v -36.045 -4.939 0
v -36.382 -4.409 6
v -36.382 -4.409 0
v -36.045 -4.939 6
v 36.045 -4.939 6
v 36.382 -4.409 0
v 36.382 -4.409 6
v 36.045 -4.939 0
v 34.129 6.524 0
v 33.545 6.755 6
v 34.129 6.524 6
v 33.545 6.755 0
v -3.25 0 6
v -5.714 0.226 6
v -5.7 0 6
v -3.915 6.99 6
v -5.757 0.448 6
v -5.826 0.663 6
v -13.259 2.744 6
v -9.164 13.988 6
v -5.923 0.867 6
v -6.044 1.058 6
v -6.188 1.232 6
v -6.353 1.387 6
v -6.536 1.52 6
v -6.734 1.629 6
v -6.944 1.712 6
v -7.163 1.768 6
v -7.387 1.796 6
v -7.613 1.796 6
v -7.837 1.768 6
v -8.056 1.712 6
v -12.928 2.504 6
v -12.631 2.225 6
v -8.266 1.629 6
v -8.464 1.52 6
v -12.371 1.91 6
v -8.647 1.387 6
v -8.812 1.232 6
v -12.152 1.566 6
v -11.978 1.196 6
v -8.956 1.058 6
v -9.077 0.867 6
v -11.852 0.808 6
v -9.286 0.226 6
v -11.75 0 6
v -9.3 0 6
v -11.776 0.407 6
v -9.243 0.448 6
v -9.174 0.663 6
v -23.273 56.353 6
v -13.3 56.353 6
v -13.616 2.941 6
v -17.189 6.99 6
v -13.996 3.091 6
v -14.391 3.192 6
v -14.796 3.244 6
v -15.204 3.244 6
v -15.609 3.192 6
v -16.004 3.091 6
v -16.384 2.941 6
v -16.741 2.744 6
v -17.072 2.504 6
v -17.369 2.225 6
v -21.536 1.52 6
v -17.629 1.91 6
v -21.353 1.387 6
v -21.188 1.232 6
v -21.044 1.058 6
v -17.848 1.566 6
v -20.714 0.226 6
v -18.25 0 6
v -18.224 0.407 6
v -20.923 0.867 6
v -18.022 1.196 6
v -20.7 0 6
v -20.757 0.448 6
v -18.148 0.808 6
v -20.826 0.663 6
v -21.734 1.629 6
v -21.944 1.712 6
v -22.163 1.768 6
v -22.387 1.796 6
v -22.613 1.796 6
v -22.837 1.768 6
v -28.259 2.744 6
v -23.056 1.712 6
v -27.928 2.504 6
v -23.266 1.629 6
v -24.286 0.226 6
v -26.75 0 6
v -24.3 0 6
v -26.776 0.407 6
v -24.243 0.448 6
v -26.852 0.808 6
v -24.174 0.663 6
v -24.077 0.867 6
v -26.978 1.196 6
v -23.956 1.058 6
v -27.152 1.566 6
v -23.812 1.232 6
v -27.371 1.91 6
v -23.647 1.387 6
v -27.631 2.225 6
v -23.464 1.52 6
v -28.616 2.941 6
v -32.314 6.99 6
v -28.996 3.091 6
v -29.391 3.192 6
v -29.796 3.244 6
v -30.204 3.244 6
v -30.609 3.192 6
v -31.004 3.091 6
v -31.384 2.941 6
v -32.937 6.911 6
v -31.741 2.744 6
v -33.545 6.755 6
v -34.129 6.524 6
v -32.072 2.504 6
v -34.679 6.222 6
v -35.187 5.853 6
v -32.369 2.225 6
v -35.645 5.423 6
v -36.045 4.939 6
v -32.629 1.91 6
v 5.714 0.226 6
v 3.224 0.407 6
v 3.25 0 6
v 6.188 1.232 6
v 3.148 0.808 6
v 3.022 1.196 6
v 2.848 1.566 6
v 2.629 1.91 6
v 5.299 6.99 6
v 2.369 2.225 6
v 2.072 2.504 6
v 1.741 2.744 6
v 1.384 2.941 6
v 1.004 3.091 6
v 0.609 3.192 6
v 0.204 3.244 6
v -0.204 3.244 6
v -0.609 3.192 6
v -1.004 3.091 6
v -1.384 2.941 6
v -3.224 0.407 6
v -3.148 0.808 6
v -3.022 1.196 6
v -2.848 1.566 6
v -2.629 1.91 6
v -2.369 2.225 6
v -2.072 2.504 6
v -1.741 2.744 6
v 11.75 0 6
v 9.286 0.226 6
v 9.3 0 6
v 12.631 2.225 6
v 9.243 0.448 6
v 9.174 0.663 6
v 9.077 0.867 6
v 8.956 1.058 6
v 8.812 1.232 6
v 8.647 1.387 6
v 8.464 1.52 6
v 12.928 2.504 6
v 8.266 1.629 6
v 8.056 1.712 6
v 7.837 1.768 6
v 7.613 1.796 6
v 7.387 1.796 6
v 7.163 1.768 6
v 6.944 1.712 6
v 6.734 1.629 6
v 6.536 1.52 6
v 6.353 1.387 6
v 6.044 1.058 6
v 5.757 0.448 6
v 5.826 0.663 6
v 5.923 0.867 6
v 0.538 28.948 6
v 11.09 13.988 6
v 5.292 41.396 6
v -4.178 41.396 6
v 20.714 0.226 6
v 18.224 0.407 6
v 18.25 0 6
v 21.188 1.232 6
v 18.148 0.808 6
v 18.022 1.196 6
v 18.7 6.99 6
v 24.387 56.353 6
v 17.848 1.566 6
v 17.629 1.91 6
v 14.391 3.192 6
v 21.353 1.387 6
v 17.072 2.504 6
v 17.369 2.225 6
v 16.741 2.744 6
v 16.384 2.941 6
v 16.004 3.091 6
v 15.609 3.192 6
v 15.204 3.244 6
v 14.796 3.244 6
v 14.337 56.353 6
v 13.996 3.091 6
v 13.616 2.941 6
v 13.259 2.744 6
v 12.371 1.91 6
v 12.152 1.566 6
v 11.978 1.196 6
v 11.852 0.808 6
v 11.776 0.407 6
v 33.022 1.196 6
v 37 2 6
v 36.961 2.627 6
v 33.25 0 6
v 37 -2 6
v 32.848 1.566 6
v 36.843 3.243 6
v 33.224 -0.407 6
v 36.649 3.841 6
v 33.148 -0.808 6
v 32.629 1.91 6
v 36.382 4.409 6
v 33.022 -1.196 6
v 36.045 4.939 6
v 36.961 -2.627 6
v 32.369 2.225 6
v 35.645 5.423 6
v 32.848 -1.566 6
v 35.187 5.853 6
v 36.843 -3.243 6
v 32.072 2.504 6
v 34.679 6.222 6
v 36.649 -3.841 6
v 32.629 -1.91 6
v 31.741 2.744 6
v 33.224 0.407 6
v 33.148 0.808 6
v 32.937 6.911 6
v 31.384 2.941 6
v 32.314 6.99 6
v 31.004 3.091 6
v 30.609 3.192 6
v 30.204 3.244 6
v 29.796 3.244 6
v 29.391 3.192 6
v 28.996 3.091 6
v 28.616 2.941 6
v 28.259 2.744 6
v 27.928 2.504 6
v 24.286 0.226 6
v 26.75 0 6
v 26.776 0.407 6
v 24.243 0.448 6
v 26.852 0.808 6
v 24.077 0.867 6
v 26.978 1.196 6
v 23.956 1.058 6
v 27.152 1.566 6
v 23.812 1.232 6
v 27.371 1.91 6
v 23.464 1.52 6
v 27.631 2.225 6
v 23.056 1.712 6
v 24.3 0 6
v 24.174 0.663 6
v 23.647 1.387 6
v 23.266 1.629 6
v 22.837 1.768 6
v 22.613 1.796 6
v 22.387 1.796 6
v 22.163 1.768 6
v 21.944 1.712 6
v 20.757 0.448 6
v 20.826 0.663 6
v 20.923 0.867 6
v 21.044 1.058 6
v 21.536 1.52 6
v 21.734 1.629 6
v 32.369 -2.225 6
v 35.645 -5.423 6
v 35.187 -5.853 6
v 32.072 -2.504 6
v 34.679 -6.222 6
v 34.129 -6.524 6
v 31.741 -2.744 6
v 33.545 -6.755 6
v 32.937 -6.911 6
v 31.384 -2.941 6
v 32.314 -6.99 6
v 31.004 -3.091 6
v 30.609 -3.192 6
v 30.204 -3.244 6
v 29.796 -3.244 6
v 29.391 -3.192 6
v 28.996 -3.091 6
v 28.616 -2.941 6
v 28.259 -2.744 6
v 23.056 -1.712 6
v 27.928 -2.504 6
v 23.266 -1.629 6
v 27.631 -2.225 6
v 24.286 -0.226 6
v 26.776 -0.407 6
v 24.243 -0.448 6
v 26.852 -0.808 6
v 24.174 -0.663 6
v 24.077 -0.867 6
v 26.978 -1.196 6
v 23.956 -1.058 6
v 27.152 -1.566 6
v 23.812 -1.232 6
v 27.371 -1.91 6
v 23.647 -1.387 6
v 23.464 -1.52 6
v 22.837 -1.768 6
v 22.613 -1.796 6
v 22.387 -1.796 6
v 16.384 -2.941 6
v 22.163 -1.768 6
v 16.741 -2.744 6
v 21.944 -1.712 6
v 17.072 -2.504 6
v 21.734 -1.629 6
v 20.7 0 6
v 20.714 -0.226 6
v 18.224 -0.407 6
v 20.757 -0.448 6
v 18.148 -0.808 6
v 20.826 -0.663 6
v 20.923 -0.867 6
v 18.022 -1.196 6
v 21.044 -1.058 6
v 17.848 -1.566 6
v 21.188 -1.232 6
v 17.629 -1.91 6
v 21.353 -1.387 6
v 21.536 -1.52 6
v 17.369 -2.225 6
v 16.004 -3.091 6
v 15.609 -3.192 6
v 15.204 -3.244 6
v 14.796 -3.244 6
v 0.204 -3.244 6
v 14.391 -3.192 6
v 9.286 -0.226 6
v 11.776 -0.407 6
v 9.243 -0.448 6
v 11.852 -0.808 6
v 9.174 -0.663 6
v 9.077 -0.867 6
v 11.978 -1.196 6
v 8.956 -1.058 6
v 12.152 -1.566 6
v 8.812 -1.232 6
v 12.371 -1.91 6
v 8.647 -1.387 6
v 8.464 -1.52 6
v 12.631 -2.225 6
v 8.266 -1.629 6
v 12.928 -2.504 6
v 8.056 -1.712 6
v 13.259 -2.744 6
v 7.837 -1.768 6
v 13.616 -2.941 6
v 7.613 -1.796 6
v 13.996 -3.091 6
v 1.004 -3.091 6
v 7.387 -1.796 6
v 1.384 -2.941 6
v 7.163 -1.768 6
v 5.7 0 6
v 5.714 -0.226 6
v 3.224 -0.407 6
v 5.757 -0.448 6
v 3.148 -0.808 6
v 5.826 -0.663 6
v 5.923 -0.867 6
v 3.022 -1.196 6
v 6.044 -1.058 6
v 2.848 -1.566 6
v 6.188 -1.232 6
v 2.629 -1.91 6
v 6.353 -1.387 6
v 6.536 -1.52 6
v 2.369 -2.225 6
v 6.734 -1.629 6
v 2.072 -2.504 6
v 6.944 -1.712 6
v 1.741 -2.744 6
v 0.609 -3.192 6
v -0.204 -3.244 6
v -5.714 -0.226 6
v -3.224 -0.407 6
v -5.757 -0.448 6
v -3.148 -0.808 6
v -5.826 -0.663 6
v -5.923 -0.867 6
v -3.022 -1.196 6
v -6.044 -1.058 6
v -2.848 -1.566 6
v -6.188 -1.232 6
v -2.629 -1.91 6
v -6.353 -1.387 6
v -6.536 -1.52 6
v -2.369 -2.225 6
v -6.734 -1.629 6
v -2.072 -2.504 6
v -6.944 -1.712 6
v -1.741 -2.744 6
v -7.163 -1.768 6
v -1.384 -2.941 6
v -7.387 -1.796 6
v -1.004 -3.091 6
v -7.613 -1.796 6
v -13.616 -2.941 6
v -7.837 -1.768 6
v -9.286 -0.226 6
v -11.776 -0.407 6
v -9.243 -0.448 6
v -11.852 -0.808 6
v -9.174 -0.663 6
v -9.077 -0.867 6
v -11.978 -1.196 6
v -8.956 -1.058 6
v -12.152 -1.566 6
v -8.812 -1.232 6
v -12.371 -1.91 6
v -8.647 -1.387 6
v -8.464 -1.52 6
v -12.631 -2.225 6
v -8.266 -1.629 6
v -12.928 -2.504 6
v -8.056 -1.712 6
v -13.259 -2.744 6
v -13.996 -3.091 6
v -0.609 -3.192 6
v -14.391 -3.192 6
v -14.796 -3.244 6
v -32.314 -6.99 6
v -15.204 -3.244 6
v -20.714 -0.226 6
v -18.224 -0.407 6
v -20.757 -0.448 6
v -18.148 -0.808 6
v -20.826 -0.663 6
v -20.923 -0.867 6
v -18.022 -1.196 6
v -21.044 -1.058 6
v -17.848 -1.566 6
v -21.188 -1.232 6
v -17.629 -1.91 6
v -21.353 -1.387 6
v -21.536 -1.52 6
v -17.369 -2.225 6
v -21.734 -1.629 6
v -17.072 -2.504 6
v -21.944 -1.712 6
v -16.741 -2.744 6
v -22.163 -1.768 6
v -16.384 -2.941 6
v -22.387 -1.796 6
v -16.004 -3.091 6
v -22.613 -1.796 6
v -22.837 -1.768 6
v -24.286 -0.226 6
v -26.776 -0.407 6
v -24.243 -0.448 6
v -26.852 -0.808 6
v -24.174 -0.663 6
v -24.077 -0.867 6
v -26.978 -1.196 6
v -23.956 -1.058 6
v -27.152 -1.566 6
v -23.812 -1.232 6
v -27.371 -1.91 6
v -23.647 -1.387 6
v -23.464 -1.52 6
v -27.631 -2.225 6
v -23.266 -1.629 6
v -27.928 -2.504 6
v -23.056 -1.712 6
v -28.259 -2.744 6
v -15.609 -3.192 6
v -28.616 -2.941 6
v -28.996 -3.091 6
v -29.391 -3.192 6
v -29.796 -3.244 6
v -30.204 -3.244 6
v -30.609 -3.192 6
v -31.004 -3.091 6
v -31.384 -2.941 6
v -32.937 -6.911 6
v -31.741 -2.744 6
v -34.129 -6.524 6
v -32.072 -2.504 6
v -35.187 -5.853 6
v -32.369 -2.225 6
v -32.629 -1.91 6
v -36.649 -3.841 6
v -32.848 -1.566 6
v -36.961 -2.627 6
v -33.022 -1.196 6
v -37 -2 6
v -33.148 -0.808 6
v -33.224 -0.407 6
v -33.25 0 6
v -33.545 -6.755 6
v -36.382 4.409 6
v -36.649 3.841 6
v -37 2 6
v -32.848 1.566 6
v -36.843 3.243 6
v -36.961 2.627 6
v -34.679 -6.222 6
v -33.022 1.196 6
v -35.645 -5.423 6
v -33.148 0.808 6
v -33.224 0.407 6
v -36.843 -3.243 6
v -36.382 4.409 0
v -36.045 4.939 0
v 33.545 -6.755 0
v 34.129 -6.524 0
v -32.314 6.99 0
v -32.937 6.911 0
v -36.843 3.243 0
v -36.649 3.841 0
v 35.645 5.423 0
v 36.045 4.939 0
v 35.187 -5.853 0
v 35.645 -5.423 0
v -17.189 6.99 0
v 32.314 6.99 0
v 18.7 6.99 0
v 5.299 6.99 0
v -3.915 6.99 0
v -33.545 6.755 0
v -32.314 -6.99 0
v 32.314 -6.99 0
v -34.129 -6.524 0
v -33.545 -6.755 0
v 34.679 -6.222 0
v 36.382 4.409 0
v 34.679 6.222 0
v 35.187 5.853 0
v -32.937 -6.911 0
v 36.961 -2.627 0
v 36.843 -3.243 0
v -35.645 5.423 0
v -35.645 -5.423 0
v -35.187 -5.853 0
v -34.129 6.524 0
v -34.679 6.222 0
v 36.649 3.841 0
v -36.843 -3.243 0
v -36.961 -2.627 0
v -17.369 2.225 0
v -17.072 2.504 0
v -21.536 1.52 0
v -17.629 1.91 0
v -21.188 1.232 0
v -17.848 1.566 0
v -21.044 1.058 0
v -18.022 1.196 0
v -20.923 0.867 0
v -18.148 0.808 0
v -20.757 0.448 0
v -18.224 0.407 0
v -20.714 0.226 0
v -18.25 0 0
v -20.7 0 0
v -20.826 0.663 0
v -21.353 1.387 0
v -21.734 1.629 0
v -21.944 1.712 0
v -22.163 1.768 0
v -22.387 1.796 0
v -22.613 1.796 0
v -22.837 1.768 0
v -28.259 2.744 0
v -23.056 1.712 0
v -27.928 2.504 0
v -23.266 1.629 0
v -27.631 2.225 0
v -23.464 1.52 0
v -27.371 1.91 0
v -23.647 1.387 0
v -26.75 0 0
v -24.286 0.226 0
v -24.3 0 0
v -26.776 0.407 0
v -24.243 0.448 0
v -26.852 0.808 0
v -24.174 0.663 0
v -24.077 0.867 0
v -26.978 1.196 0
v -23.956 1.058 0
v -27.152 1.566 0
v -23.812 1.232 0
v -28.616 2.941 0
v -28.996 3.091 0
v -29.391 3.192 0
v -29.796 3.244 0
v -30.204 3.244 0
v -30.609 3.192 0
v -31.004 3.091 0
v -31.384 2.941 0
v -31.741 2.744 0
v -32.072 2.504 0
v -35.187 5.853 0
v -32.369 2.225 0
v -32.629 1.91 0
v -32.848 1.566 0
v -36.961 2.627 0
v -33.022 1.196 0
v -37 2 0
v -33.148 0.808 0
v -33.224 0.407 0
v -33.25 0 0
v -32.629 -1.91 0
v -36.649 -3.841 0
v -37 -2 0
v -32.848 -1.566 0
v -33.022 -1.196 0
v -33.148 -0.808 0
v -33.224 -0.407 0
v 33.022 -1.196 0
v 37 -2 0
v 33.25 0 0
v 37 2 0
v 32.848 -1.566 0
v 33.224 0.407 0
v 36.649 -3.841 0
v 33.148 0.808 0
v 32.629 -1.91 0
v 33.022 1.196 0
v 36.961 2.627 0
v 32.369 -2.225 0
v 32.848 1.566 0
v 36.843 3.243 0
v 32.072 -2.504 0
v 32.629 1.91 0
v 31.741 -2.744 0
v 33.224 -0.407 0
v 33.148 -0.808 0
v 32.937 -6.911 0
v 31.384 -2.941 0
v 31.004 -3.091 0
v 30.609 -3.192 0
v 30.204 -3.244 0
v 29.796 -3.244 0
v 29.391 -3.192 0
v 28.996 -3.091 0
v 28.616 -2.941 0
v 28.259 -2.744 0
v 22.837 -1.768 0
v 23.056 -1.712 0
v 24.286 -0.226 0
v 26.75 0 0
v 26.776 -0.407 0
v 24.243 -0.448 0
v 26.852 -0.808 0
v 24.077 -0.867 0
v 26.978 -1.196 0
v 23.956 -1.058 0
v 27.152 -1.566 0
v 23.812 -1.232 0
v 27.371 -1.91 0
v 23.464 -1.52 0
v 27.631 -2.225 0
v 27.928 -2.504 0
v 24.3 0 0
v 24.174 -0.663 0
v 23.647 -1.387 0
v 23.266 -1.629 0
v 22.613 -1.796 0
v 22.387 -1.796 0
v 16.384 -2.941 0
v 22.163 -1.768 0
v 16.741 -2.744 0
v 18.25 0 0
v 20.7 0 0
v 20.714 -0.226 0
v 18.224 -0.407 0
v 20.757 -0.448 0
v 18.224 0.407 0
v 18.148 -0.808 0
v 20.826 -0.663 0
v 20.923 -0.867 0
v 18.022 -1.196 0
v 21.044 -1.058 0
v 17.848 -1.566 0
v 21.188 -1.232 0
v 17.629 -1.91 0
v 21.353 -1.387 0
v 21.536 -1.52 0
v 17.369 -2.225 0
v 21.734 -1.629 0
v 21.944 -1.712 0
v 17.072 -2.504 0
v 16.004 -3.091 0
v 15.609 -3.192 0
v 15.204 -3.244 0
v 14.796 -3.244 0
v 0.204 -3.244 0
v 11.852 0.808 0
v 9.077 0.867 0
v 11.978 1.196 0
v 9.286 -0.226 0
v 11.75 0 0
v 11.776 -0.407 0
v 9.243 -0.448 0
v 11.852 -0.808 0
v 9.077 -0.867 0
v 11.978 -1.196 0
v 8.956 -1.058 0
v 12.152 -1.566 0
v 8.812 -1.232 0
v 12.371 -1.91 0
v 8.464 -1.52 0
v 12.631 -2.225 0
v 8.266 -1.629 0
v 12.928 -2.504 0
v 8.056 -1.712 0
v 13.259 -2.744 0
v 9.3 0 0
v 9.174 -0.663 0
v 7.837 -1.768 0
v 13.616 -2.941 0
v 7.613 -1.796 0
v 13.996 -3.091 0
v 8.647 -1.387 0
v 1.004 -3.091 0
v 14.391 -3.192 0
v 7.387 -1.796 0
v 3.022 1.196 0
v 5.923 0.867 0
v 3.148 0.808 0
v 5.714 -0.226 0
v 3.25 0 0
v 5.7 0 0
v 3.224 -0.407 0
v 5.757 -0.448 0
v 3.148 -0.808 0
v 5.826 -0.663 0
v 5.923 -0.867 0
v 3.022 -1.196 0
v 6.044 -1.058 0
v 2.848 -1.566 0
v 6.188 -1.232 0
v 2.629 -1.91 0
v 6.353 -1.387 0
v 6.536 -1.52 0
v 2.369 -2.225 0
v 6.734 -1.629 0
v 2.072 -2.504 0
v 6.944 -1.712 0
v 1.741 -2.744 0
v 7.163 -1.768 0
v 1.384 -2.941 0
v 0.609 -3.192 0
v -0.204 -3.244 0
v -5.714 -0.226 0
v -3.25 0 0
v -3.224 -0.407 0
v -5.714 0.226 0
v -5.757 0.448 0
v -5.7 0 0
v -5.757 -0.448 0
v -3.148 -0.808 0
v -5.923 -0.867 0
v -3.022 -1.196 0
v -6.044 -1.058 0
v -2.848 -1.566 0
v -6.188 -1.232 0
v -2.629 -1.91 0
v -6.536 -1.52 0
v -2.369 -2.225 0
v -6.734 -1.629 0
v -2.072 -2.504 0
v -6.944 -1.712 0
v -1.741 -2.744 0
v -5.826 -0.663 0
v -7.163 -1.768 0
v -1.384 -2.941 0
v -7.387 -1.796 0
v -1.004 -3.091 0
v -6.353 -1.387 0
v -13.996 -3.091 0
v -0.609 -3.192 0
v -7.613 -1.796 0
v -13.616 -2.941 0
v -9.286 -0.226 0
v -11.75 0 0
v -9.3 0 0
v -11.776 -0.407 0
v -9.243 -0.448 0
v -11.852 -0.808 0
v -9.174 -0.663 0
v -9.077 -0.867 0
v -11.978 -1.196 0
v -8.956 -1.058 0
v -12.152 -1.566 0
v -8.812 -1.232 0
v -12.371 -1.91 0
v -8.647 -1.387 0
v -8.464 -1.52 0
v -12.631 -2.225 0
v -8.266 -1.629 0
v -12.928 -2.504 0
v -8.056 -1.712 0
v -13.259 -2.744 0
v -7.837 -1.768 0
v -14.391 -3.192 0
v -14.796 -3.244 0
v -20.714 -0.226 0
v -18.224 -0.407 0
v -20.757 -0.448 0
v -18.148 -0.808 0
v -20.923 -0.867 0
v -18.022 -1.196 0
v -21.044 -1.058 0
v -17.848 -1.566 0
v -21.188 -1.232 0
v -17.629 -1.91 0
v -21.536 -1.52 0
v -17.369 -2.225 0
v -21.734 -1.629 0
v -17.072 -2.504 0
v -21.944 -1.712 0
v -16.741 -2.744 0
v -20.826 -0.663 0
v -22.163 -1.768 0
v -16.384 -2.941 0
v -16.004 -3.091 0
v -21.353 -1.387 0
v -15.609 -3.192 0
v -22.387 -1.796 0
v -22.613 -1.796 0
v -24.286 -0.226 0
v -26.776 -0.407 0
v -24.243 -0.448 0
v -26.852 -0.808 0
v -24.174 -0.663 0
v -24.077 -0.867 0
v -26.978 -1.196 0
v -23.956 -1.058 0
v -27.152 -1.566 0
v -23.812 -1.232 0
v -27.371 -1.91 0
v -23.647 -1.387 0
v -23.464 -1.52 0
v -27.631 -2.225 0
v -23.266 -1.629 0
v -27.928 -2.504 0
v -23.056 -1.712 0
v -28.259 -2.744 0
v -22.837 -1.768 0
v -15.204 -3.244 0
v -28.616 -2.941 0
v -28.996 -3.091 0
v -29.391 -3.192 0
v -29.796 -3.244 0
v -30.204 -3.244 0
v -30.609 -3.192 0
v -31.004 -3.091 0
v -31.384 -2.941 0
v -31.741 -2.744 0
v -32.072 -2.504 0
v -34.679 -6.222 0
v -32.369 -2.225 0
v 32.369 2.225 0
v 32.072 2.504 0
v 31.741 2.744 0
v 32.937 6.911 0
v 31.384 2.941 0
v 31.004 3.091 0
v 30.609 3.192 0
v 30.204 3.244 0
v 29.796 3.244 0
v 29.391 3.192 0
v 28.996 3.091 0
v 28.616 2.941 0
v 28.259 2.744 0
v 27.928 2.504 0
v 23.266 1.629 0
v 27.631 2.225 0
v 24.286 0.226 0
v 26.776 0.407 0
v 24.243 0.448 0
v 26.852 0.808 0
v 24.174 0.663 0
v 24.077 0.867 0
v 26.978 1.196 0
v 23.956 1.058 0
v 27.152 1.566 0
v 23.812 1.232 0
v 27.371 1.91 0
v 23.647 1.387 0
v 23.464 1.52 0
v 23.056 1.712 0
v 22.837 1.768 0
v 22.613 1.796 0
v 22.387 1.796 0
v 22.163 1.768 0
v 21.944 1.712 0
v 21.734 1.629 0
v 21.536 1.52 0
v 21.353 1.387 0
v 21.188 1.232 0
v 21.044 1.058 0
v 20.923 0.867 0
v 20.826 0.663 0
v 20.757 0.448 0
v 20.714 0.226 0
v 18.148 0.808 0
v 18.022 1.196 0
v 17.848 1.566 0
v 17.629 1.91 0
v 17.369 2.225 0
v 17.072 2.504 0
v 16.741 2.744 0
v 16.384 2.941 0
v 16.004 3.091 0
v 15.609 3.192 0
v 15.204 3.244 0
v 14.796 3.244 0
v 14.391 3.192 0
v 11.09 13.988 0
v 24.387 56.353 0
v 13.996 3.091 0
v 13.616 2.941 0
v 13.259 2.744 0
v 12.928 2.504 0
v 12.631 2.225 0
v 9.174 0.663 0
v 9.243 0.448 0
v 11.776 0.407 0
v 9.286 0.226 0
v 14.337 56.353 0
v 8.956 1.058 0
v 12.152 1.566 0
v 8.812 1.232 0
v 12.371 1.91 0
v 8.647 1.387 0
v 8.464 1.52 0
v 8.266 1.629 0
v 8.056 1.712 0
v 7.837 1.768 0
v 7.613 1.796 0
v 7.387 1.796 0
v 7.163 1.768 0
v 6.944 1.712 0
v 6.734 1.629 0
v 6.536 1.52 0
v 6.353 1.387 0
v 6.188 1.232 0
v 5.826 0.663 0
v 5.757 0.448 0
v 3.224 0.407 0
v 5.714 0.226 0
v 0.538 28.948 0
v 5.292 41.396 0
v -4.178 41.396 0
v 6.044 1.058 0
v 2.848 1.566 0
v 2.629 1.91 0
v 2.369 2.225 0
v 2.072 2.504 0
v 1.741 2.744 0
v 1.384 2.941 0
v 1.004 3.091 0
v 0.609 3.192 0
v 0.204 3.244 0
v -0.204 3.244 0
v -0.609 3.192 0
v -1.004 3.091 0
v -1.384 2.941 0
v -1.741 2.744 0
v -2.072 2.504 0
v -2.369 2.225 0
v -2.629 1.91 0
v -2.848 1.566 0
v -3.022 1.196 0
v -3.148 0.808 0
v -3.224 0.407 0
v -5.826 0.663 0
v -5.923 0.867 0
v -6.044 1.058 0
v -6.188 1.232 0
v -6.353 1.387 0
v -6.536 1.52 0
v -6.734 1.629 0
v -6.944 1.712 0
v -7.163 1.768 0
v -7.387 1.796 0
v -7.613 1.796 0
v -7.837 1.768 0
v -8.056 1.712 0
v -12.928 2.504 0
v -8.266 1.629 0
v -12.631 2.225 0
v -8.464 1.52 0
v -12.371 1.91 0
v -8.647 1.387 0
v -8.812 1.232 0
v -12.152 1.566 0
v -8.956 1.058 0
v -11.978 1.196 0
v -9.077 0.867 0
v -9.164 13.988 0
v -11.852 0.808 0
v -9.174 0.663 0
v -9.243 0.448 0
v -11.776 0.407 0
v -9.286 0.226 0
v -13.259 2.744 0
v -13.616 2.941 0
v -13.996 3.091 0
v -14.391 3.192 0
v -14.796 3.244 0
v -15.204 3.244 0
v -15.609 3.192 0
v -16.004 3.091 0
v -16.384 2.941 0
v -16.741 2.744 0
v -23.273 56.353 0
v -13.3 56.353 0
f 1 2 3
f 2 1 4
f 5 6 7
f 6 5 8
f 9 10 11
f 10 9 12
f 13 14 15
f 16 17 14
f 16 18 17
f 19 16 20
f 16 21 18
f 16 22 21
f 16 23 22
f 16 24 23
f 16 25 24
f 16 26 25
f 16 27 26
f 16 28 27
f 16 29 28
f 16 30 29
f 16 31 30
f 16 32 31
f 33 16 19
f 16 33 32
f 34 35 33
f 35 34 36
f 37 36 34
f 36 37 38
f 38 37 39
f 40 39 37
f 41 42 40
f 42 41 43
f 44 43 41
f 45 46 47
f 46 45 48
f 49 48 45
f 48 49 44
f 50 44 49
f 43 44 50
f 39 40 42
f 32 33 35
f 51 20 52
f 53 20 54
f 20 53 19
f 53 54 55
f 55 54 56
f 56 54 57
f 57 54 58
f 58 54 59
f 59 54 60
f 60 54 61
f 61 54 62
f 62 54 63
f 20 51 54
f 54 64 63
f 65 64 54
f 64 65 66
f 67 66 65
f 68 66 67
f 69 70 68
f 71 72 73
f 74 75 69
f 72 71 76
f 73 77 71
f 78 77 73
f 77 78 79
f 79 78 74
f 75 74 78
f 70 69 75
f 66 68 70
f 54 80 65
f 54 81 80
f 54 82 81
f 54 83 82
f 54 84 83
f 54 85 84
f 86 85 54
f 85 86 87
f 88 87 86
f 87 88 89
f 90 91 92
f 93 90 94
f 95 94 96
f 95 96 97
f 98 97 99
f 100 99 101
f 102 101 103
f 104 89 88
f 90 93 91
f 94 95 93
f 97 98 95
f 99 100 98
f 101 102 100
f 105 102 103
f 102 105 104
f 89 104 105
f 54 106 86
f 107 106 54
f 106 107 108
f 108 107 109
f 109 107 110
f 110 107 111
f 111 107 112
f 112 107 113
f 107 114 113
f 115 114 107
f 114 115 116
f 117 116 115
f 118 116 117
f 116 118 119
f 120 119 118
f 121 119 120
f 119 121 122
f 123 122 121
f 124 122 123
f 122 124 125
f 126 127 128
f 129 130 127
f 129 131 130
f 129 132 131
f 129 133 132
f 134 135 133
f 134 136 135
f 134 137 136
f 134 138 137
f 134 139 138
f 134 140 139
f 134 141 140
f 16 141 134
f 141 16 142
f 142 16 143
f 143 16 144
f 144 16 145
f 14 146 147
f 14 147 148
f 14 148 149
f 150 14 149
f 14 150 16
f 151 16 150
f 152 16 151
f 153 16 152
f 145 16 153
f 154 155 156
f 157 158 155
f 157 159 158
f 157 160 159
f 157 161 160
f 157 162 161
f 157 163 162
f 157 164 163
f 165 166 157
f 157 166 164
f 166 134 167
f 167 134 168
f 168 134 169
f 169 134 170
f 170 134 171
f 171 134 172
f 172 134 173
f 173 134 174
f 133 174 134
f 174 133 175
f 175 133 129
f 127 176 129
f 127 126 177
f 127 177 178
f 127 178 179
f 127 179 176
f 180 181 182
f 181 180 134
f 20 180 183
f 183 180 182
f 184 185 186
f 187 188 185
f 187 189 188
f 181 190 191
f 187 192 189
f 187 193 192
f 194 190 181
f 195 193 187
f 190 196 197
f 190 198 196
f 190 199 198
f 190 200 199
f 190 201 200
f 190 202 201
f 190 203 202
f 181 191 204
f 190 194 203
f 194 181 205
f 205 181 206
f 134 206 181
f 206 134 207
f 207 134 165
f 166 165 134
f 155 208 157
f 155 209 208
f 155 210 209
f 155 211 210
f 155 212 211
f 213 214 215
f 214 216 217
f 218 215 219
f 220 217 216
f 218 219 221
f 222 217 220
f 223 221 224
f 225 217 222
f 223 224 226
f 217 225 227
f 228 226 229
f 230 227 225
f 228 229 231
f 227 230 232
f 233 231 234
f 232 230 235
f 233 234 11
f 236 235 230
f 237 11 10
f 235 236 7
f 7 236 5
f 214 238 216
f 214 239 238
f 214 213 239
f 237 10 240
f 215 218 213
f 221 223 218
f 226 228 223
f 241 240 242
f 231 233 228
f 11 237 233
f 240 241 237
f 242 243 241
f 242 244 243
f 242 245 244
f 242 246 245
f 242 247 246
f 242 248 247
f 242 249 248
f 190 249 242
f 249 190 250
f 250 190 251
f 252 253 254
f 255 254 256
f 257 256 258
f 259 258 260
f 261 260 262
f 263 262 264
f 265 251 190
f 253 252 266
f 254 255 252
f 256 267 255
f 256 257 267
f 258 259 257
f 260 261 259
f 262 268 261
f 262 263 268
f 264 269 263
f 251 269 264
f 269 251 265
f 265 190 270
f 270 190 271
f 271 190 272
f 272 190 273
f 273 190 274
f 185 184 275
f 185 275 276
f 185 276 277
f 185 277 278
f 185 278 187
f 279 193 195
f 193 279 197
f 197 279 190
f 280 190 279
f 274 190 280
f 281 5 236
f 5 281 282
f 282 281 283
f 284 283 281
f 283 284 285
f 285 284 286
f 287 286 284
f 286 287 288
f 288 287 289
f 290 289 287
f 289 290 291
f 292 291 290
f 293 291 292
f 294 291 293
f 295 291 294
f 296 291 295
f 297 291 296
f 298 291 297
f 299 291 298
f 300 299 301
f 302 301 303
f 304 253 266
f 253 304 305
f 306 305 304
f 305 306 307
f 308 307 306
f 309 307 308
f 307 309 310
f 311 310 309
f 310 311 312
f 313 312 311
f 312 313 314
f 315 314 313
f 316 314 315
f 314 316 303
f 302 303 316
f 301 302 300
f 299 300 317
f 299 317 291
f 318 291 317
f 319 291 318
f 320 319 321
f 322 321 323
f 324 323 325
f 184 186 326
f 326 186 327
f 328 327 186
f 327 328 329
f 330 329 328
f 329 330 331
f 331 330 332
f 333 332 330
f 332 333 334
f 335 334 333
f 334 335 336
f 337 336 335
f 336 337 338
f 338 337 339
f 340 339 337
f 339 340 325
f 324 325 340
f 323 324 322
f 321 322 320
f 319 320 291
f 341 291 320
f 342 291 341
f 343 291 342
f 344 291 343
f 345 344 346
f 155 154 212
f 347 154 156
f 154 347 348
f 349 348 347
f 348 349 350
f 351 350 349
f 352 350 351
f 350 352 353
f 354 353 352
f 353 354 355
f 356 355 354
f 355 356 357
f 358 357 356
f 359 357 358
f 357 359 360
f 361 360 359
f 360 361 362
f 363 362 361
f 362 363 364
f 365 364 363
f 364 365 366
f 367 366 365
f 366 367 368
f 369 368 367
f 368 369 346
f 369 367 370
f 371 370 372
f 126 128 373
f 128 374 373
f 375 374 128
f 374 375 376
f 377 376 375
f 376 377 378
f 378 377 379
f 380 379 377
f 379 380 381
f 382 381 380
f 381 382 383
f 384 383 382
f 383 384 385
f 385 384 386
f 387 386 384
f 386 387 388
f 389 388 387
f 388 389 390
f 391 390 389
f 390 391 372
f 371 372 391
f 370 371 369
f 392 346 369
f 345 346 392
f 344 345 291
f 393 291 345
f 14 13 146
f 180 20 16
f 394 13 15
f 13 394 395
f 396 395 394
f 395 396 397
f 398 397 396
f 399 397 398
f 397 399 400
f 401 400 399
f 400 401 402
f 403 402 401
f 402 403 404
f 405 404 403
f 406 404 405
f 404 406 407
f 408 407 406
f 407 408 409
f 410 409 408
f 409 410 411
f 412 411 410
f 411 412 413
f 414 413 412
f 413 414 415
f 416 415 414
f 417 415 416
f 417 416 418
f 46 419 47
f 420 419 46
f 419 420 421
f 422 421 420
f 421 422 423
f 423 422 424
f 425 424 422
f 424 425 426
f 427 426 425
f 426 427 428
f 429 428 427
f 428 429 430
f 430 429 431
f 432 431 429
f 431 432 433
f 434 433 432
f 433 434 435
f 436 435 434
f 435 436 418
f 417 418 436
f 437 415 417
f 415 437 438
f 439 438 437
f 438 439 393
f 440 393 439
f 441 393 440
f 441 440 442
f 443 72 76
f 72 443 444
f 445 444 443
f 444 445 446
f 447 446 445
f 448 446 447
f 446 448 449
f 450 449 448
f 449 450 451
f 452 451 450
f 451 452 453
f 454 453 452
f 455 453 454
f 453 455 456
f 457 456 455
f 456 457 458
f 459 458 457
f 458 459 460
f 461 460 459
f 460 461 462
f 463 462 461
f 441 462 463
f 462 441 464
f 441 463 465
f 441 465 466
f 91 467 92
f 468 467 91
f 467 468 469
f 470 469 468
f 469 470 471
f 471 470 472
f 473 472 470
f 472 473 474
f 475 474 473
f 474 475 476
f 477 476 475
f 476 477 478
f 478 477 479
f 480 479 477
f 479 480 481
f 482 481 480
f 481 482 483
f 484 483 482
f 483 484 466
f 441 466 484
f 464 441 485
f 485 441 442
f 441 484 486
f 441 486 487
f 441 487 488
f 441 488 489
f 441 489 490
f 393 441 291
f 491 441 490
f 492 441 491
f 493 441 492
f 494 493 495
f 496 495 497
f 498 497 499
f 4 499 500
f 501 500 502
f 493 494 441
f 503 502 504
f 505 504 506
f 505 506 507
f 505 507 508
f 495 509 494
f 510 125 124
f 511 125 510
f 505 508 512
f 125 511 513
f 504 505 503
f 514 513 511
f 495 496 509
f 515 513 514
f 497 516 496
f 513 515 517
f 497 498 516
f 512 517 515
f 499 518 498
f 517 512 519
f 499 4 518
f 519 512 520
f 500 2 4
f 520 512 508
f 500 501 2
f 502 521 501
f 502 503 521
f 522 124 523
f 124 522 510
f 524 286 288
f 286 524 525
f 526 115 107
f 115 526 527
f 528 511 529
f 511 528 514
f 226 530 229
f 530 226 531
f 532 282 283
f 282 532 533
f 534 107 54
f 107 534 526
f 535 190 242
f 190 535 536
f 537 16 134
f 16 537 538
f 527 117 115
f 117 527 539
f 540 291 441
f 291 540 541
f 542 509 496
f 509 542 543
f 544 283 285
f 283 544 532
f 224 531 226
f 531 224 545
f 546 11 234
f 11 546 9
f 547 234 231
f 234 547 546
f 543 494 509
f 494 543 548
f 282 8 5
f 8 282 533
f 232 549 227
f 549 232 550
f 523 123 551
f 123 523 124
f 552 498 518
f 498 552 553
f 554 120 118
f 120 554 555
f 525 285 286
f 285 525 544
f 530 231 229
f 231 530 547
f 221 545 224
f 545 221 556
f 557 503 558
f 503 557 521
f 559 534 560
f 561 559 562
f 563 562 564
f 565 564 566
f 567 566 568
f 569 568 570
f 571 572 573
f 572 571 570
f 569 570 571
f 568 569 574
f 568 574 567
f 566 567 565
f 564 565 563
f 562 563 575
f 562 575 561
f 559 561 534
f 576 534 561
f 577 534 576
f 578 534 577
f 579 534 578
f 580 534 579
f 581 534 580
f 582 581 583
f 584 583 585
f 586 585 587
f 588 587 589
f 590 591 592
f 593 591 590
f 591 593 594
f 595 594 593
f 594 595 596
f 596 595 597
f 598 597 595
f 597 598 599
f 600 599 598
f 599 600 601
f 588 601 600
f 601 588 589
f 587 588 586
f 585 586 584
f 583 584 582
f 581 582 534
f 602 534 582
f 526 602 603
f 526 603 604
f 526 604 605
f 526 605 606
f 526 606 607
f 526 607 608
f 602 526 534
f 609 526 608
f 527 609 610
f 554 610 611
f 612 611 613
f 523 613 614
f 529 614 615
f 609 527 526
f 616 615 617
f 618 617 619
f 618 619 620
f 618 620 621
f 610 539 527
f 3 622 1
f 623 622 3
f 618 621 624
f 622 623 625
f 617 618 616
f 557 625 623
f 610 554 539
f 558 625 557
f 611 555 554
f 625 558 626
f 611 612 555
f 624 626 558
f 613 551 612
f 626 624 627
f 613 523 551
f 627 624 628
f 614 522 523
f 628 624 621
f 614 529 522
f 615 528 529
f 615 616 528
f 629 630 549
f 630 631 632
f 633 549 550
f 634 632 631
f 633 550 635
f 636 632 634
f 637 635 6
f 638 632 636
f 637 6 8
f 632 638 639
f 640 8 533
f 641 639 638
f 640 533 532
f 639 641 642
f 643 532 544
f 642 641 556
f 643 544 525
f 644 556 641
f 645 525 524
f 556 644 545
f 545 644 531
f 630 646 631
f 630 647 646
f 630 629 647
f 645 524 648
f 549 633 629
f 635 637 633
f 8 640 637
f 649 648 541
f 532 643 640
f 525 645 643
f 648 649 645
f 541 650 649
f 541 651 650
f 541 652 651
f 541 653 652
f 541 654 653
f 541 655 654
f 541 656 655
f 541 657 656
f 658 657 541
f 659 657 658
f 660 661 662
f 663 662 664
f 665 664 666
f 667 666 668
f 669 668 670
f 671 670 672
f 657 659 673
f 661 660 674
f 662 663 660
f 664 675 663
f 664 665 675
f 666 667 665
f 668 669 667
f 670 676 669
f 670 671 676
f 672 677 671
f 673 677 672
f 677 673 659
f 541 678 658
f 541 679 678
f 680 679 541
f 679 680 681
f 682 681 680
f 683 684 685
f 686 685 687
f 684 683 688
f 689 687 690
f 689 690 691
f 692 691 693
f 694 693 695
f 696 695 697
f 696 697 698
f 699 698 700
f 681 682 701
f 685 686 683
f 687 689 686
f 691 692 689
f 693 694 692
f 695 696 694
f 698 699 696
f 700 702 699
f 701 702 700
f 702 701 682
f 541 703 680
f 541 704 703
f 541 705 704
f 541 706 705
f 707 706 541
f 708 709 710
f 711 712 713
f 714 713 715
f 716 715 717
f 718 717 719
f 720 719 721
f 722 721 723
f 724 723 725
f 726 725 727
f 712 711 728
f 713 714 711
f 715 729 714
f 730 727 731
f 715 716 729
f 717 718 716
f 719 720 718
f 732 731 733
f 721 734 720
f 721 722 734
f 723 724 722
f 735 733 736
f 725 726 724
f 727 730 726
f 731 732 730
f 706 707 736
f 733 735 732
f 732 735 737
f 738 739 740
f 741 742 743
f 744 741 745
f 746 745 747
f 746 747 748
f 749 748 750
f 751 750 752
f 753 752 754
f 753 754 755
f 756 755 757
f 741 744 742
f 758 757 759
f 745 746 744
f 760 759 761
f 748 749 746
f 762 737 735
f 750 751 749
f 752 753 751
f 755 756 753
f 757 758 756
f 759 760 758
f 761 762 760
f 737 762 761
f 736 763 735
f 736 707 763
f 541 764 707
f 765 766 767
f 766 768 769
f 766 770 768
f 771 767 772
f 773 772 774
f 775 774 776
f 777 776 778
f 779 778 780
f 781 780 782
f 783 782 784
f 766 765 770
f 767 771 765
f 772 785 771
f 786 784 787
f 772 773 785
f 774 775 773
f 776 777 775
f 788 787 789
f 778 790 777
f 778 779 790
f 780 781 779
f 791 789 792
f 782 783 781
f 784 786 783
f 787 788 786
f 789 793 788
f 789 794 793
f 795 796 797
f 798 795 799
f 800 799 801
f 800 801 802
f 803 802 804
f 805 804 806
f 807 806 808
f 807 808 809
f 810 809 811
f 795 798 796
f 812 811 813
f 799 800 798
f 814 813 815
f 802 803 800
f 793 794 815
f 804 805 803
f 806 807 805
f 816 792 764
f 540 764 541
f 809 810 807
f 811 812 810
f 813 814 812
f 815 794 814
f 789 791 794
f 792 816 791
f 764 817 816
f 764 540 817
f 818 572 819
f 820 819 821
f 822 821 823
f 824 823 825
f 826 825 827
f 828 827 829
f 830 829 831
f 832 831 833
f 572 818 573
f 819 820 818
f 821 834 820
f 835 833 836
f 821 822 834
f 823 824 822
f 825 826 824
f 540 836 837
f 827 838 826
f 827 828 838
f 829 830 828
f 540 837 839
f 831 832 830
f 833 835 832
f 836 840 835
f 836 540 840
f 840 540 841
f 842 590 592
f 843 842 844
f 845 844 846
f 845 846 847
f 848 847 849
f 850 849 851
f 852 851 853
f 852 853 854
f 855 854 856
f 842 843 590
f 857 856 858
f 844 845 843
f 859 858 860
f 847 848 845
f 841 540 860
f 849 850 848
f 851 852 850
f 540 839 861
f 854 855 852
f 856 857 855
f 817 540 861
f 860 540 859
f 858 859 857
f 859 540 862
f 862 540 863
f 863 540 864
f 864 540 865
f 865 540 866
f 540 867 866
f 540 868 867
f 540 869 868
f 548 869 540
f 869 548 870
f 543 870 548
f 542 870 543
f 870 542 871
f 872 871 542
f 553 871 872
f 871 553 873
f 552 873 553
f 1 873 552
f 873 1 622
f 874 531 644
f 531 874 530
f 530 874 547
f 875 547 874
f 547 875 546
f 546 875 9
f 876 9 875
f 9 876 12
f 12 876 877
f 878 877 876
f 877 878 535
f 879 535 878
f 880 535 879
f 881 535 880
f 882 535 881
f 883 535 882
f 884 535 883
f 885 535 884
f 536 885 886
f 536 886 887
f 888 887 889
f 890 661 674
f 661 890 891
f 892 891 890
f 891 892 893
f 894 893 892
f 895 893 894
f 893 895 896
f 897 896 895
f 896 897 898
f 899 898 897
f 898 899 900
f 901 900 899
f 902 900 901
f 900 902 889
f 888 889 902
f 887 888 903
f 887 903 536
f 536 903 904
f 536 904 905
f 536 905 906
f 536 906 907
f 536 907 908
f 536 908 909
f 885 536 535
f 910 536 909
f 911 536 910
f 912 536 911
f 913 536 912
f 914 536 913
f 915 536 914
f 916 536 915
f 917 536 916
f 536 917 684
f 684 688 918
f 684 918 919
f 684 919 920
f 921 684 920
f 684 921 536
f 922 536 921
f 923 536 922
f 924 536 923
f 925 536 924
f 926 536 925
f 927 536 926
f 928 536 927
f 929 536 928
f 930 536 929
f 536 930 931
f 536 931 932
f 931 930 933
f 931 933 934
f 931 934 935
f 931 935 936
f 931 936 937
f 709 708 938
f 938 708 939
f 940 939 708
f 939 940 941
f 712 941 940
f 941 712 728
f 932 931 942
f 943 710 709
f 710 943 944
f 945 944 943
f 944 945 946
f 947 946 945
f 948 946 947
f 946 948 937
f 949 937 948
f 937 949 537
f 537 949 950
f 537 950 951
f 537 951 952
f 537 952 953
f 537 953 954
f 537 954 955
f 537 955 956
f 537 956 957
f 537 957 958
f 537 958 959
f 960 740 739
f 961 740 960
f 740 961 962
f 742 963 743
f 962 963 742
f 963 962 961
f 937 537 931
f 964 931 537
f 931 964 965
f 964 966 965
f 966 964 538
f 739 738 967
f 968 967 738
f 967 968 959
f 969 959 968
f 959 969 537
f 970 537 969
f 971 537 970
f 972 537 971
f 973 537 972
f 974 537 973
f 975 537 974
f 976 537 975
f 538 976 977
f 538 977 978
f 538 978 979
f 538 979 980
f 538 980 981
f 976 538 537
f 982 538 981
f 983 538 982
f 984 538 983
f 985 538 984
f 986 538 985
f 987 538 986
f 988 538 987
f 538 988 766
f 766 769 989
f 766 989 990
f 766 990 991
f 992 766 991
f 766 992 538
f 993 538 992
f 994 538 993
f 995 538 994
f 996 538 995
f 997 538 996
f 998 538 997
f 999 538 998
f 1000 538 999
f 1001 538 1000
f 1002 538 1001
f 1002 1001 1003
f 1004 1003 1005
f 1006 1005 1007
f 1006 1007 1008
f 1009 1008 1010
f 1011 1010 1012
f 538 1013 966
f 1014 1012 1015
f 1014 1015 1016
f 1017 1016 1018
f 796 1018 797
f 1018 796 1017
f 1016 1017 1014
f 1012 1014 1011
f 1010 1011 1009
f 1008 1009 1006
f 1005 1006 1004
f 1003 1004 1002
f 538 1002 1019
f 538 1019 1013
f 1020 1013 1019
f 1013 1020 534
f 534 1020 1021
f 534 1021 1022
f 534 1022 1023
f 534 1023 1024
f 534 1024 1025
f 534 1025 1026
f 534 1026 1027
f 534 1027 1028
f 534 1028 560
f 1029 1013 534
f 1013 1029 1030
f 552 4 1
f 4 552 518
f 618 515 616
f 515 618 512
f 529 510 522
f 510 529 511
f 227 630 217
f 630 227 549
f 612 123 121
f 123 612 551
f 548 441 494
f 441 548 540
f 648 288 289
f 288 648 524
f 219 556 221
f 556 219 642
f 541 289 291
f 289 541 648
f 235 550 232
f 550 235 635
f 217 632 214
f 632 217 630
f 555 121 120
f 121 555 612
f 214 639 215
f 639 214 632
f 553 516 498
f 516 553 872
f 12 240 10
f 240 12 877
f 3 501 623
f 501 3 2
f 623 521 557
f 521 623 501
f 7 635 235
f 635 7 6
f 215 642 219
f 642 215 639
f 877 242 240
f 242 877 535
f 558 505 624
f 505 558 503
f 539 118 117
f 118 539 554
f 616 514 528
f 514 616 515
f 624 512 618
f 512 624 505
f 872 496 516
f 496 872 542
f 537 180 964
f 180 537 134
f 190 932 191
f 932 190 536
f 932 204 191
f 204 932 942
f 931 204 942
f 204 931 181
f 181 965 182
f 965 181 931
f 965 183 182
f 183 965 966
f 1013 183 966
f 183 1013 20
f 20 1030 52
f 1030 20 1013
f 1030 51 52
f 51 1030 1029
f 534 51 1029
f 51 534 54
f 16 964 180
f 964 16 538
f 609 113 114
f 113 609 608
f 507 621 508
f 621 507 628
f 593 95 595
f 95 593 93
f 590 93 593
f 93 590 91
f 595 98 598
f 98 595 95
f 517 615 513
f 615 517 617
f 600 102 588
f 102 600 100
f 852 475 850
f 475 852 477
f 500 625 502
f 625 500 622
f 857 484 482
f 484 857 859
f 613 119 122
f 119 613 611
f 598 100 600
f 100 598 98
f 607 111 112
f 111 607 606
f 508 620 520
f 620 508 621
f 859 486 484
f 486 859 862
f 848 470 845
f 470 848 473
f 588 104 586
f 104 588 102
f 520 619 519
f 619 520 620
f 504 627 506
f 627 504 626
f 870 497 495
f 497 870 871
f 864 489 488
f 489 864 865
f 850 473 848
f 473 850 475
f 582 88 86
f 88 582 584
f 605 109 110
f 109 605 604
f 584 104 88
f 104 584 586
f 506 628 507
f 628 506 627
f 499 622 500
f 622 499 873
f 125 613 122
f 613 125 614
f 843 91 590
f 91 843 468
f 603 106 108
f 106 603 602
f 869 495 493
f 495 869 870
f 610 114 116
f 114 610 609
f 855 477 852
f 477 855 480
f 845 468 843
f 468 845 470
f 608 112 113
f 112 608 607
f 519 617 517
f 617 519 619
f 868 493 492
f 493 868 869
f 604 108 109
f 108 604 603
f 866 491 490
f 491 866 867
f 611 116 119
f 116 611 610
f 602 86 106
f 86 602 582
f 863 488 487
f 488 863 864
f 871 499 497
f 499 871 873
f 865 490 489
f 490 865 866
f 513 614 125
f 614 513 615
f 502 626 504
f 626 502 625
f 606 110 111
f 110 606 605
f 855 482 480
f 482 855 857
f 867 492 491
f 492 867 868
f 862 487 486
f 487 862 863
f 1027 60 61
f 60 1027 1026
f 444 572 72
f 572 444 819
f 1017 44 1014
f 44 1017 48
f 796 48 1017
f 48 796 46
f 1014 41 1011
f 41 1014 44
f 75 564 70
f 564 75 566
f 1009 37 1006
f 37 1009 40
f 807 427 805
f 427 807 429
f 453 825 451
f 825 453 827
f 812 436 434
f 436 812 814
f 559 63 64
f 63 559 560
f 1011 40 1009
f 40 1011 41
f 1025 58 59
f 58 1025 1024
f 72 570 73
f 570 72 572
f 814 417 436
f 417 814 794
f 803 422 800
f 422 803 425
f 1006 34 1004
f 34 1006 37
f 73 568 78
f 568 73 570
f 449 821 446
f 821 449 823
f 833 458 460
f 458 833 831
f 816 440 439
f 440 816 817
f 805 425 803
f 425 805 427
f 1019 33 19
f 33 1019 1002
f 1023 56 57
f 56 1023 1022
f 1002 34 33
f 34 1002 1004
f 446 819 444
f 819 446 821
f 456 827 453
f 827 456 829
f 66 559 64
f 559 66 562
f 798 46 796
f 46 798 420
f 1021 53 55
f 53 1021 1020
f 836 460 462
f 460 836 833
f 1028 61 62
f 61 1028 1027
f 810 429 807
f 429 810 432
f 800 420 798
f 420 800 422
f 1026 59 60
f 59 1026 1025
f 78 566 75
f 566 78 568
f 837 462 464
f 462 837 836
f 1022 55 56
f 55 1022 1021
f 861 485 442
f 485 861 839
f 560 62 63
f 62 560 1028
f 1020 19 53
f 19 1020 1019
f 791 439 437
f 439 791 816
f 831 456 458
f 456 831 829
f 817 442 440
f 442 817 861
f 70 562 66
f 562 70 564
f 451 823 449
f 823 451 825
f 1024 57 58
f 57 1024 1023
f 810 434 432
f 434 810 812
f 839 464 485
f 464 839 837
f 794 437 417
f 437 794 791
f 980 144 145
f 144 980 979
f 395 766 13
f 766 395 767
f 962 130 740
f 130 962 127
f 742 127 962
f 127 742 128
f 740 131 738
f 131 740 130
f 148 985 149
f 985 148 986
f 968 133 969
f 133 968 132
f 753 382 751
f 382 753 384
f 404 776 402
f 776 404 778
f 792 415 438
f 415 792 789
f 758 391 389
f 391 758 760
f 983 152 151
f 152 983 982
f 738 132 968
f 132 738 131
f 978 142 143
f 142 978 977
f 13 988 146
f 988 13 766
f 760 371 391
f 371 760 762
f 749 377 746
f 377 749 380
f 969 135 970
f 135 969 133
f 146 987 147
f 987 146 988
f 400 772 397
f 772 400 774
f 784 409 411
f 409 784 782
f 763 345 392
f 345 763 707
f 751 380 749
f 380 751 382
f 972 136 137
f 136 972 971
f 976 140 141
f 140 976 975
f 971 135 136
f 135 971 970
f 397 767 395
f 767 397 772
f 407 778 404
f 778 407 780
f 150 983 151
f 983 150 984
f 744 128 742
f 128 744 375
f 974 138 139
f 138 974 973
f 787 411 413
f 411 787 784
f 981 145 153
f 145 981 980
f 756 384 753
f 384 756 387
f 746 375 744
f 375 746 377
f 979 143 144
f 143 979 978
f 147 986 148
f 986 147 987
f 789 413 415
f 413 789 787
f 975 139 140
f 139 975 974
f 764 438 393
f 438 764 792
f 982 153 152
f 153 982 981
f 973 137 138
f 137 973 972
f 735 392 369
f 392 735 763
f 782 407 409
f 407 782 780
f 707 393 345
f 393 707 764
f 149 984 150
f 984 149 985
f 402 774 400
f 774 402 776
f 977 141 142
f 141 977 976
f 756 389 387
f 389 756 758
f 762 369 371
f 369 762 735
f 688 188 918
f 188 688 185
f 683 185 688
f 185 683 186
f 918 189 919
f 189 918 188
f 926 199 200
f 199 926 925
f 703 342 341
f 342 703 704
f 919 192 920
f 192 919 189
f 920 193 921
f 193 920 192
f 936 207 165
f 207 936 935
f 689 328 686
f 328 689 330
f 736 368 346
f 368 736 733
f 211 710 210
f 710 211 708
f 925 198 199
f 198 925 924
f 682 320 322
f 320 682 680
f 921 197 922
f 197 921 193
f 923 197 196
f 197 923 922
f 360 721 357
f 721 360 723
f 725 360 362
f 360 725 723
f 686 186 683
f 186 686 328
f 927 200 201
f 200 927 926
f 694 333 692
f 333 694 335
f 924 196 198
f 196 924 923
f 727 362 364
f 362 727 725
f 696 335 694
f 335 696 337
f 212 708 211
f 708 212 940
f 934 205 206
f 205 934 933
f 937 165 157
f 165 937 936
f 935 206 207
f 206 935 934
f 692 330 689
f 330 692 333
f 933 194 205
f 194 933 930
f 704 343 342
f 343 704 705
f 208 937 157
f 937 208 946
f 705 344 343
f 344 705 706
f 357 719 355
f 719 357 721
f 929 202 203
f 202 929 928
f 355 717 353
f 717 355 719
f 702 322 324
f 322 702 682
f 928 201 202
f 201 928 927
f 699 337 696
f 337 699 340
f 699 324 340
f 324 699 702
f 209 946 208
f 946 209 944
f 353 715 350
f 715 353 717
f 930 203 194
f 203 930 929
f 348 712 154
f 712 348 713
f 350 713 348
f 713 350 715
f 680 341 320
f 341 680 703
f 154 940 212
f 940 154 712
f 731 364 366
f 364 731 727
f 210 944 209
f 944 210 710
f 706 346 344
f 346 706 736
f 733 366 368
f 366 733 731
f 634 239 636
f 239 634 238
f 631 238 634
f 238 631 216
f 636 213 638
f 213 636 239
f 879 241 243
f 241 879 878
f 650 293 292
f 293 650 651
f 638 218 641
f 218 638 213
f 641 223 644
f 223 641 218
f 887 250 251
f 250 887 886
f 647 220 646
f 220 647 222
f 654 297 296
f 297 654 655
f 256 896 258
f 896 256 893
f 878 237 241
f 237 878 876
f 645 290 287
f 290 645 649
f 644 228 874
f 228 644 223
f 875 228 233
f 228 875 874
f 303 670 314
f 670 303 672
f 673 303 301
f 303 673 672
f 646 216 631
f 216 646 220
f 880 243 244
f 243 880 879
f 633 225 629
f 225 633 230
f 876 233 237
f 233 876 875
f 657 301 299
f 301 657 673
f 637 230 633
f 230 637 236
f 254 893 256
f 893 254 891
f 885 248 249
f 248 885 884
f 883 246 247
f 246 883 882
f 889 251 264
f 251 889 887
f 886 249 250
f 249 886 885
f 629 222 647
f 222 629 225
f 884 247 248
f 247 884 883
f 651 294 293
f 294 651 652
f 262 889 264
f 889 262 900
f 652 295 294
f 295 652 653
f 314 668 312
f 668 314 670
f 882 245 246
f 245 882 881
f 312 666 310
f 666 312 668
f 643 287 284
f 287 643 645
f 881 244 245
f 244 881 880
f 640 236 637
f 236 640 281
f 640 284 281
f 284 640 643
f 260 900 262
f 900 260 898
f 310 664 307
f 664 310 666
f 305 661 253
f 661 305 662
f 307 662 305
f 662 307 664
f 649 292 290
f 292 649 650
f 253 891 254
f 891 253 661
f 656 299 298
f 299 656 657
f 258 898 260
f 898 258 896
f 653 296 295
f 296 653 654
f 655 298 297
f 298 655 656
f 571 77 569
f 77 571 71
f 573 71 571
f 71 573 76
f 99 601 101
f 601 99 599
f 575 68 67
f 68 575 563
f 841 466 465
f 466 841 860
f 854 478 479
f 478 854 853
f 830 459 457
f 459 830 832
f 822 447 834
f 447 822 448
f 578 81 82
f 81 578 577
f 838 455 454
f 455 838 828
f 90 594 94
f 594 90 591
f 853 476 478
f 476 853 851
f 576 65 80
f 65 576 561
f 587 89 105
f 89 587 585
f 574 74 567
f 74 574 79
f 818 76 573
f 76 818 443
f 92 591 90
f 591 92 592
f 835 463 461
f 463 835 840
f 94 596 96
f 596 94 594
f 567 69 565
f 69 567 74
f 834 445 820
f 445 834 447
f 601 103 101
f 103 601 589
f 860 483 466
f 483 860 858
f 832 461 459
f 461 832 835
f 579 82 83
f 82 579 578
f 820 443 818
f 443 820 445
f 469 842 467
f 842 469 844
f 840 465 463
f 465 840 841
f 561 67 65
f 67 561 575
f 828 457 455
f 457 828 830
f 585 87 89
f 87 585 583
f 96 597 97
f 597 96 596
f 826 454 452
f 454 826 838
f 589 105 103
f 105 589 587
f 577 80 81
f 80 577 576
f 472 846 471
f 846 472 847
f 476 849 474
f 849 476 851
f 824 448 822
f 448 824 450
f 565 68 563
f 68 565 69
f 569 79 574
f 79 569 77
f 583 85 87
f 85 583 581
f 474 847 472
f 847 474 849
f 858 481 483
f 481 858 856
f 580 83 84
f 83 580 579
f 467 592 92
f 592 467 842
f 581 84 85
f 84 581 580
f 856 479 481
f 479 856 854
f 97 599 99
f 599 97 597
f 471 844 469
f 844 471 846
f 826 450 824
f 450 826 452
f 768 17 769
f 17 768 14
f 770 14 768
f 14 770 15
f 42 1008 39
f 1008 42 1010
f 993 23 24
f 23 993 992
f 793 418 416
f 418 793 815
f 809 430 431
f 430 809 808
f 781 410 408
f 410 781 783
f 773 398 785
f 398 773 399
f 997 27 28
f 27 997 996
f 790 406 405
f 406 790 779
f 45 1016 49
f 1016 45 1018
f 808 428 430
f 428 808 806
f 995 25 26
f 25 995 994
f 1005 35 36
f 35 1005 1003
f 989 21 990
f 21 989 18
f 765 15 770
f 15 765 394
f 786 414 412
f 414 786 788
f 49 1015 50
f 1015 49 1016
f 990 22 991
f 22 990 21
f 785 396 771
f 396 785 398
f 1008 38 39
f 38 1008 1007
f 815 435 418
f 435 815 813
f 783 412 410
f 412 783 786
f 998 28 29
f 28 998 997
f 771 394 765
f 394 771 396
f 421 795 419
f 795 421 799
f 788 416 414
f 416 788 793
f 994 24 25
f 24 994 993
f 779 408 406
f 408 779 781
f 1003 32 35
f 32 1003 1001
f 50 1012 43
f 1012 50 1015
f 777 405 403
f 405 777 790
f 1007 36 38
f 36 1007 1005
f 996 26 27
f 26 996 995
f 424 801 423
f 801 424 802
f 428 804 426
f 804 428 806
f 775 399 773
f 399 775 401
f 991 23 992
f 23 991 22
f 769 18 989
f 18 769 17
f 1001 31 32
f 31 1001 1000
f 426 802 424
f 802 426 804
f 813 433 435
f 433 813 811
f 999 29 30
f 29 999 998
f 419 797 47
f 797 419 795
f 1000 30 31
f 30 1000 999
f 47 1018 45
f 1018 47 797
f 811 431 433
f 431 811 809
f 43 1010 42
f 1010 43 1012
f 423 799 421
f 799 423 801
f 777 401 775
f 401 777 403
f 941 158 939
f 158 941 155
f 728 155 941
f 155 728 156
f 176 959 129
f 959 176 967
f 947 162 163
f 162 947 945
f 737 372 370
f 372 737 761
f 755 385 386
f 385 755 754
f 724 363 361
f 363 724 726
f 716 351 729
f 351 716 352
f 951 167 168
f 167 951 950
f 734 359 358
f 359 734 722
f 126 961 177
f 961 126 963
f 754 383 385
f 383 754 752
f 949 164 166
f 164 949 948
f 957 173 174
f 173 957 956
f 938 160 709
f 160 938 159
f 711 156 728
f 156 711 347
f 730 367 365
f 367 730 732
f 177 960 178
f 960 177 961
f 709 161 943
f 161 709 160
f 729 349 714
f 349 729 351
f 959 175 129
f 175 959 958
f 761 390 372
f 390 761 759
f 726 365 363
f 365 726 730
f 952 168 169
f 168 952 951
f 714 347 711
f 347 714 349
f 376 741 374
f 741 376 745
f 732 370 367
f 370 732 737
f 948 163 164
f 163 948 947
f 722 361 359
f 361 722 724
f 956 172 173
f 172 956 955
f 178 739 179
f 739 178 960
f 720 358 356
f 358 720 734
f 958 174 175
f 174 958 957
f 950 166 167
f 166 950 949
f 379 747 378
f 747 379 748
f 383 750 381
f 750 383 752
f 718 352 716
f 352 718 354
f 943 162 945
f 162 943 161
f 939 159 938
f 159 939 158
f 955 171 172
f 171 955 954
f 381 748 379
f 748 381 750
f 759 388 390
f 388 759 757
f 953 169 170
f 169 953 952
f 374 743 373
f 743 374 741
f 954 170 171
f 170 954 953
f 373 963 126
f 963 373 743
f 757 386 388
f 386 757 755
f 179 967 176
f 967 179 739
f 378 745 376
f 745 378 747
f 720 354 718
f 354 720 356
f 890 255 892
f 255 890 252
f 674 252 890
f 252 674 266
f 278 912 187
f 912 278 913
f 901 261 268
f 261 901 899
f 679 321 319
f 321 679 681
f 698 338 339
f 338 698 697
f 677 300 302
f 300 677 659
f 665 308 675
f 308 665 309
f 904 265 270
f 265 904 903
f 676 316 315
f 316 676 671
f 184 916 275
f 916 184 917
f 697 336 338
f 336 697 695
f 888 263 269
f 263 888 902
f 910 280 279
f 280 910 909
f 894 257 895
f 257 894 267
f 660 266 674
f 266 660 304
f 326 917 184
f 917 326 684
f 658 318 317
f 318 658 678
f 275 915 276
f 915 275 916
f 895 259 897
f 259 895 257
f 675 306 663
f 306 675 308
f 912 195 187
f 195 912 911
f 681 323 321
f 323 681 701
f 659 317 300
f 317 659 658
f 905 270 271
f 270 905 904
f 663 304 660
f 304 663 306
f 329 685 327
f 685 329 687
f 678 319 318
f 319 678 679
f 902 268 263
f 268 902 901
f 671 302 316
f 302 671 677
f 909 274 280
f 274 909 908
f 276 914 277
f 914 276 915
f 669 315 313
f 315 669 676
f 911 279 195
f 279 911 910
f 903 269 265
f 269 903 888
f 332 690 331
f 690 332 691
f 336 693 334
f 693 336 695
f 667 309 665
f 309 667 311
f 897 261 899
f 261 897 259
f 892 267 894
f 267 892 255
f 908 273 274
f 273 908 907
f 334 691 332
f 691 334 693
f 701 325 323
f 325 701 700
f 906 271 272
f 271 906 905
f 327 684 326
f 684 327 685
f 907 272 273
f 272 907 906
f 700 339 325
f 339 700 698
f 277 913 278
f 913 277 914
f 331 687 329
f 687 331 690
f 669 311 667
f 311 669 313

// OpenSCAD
$fn = 50;


difference() {
	union() {
		hull() {
			translate(v = [-32.0000000000, 2.0000000000, 0]) {
				cylinder(h = 6, r = 5);
			}
			translate(v = [32.0000000000, 2.0000000000, 0]) {
				cylinder(h = 6, r = 5);
			}
			translate(v = [-32.0000000000, -2.0000000000, 0]) {
				cylinder(h = 6, r = 5);
			}
			translate(v = [32.0000000000, -2.0000000000, 0]) {
				cylinder(h = 6, r = 5);
			}
		}
		translate(v = [0, 55, 0]) {
			linear_extrude(height = 6) {
				text(font = "DejaVu Sans Mono:style=Bold", halign = "center", size = 57.0000000000, text = "W", valign = "top");
			}
		}
	}
	union() {
		translate(v = [-30.0000000000, 0.0000000000, 0]) {
			translate(v = [0, 0, -100]) {
				cylinder(h = 200, r = 3.2500000000);
			}
		}
		translate(v = [-15.0000000000, 0.0000000000, 0]) {
			translate(v = [0, 0, -100]) {
				cylinder(h = 200, r = 3.2500000000);
			}
		}
		translate(v = [0, 0, -100]) {
			cylinder(h = 200, r = 3.2500000000);
		}
		translate(v = [15.0000000000, 0.0000000000, 0]) {
			translate(v = [0, 0, -100]) {
				cylinder(h = 200, r = 3.2500000000);
			}
		}
		translate(v = [30.0000000000, 0.0000000000, 0]) {
			translate(v = [0, 0, -100]) {
				cylinder(h = 200, r = 3.2500000000);
			}
		}
		translate(v = [-30.0000000000, 0.0000000000, 0]) {
			translate(v = [0, 0, -100]) {
				cylinder(h = 200, r = 1.8000000000);
			}
		}
		translate(v = [-22.5000000000, 0.0000000000, 0]) {
			translate(v = [0, 0, -100]) {
				cylinder(h = 200, r = 1.8000000000);
			}
		}
		translate(v = [-15.0000000000, 0.0000000000, 0]) {
			translate(v = [0, 0, -100]) {
				cylinder(h = 200, r = 1.8000000000);
			}
		}
		translate(v = [-7.5000000000, 0.0000000000, 0]) {
			translate(v = [0, 0, -100]) {
				cylinder(h = 200, r = 1.8000000000);
			}
		}
		translate(v = [0, 0, -100]) {
			cylinder(h = 200, r = 1.8000000000);
		}
		translate(v = [7.5000000000, 0.0000000000, 0]) {
			translate(v = [0, 0, -100]) {
				cylinder(h = 200, r = 1.8000000000);
			}
		}
		translate(v = [15.0000000000, 0.0000000000, 0]) {
			translate(v = [0, 0, -100]) {
				cylinder(h = 200, r = 1.8000000000);
			}
		}
		translate(v = [22.5000000000, 0.0000000000, 0]) {
			translate(v = [0, 0, -100]) {
				cylinder(h = 200, r = 1.8000000000);
			}
		}
		translate(v = [30.0000000000, 0.0000000000, 0]) {
			translate(v = [0, 0, -100]) {
				cylinder(h = 200, r = 1.8000000000);
			}
		}
	}
}
